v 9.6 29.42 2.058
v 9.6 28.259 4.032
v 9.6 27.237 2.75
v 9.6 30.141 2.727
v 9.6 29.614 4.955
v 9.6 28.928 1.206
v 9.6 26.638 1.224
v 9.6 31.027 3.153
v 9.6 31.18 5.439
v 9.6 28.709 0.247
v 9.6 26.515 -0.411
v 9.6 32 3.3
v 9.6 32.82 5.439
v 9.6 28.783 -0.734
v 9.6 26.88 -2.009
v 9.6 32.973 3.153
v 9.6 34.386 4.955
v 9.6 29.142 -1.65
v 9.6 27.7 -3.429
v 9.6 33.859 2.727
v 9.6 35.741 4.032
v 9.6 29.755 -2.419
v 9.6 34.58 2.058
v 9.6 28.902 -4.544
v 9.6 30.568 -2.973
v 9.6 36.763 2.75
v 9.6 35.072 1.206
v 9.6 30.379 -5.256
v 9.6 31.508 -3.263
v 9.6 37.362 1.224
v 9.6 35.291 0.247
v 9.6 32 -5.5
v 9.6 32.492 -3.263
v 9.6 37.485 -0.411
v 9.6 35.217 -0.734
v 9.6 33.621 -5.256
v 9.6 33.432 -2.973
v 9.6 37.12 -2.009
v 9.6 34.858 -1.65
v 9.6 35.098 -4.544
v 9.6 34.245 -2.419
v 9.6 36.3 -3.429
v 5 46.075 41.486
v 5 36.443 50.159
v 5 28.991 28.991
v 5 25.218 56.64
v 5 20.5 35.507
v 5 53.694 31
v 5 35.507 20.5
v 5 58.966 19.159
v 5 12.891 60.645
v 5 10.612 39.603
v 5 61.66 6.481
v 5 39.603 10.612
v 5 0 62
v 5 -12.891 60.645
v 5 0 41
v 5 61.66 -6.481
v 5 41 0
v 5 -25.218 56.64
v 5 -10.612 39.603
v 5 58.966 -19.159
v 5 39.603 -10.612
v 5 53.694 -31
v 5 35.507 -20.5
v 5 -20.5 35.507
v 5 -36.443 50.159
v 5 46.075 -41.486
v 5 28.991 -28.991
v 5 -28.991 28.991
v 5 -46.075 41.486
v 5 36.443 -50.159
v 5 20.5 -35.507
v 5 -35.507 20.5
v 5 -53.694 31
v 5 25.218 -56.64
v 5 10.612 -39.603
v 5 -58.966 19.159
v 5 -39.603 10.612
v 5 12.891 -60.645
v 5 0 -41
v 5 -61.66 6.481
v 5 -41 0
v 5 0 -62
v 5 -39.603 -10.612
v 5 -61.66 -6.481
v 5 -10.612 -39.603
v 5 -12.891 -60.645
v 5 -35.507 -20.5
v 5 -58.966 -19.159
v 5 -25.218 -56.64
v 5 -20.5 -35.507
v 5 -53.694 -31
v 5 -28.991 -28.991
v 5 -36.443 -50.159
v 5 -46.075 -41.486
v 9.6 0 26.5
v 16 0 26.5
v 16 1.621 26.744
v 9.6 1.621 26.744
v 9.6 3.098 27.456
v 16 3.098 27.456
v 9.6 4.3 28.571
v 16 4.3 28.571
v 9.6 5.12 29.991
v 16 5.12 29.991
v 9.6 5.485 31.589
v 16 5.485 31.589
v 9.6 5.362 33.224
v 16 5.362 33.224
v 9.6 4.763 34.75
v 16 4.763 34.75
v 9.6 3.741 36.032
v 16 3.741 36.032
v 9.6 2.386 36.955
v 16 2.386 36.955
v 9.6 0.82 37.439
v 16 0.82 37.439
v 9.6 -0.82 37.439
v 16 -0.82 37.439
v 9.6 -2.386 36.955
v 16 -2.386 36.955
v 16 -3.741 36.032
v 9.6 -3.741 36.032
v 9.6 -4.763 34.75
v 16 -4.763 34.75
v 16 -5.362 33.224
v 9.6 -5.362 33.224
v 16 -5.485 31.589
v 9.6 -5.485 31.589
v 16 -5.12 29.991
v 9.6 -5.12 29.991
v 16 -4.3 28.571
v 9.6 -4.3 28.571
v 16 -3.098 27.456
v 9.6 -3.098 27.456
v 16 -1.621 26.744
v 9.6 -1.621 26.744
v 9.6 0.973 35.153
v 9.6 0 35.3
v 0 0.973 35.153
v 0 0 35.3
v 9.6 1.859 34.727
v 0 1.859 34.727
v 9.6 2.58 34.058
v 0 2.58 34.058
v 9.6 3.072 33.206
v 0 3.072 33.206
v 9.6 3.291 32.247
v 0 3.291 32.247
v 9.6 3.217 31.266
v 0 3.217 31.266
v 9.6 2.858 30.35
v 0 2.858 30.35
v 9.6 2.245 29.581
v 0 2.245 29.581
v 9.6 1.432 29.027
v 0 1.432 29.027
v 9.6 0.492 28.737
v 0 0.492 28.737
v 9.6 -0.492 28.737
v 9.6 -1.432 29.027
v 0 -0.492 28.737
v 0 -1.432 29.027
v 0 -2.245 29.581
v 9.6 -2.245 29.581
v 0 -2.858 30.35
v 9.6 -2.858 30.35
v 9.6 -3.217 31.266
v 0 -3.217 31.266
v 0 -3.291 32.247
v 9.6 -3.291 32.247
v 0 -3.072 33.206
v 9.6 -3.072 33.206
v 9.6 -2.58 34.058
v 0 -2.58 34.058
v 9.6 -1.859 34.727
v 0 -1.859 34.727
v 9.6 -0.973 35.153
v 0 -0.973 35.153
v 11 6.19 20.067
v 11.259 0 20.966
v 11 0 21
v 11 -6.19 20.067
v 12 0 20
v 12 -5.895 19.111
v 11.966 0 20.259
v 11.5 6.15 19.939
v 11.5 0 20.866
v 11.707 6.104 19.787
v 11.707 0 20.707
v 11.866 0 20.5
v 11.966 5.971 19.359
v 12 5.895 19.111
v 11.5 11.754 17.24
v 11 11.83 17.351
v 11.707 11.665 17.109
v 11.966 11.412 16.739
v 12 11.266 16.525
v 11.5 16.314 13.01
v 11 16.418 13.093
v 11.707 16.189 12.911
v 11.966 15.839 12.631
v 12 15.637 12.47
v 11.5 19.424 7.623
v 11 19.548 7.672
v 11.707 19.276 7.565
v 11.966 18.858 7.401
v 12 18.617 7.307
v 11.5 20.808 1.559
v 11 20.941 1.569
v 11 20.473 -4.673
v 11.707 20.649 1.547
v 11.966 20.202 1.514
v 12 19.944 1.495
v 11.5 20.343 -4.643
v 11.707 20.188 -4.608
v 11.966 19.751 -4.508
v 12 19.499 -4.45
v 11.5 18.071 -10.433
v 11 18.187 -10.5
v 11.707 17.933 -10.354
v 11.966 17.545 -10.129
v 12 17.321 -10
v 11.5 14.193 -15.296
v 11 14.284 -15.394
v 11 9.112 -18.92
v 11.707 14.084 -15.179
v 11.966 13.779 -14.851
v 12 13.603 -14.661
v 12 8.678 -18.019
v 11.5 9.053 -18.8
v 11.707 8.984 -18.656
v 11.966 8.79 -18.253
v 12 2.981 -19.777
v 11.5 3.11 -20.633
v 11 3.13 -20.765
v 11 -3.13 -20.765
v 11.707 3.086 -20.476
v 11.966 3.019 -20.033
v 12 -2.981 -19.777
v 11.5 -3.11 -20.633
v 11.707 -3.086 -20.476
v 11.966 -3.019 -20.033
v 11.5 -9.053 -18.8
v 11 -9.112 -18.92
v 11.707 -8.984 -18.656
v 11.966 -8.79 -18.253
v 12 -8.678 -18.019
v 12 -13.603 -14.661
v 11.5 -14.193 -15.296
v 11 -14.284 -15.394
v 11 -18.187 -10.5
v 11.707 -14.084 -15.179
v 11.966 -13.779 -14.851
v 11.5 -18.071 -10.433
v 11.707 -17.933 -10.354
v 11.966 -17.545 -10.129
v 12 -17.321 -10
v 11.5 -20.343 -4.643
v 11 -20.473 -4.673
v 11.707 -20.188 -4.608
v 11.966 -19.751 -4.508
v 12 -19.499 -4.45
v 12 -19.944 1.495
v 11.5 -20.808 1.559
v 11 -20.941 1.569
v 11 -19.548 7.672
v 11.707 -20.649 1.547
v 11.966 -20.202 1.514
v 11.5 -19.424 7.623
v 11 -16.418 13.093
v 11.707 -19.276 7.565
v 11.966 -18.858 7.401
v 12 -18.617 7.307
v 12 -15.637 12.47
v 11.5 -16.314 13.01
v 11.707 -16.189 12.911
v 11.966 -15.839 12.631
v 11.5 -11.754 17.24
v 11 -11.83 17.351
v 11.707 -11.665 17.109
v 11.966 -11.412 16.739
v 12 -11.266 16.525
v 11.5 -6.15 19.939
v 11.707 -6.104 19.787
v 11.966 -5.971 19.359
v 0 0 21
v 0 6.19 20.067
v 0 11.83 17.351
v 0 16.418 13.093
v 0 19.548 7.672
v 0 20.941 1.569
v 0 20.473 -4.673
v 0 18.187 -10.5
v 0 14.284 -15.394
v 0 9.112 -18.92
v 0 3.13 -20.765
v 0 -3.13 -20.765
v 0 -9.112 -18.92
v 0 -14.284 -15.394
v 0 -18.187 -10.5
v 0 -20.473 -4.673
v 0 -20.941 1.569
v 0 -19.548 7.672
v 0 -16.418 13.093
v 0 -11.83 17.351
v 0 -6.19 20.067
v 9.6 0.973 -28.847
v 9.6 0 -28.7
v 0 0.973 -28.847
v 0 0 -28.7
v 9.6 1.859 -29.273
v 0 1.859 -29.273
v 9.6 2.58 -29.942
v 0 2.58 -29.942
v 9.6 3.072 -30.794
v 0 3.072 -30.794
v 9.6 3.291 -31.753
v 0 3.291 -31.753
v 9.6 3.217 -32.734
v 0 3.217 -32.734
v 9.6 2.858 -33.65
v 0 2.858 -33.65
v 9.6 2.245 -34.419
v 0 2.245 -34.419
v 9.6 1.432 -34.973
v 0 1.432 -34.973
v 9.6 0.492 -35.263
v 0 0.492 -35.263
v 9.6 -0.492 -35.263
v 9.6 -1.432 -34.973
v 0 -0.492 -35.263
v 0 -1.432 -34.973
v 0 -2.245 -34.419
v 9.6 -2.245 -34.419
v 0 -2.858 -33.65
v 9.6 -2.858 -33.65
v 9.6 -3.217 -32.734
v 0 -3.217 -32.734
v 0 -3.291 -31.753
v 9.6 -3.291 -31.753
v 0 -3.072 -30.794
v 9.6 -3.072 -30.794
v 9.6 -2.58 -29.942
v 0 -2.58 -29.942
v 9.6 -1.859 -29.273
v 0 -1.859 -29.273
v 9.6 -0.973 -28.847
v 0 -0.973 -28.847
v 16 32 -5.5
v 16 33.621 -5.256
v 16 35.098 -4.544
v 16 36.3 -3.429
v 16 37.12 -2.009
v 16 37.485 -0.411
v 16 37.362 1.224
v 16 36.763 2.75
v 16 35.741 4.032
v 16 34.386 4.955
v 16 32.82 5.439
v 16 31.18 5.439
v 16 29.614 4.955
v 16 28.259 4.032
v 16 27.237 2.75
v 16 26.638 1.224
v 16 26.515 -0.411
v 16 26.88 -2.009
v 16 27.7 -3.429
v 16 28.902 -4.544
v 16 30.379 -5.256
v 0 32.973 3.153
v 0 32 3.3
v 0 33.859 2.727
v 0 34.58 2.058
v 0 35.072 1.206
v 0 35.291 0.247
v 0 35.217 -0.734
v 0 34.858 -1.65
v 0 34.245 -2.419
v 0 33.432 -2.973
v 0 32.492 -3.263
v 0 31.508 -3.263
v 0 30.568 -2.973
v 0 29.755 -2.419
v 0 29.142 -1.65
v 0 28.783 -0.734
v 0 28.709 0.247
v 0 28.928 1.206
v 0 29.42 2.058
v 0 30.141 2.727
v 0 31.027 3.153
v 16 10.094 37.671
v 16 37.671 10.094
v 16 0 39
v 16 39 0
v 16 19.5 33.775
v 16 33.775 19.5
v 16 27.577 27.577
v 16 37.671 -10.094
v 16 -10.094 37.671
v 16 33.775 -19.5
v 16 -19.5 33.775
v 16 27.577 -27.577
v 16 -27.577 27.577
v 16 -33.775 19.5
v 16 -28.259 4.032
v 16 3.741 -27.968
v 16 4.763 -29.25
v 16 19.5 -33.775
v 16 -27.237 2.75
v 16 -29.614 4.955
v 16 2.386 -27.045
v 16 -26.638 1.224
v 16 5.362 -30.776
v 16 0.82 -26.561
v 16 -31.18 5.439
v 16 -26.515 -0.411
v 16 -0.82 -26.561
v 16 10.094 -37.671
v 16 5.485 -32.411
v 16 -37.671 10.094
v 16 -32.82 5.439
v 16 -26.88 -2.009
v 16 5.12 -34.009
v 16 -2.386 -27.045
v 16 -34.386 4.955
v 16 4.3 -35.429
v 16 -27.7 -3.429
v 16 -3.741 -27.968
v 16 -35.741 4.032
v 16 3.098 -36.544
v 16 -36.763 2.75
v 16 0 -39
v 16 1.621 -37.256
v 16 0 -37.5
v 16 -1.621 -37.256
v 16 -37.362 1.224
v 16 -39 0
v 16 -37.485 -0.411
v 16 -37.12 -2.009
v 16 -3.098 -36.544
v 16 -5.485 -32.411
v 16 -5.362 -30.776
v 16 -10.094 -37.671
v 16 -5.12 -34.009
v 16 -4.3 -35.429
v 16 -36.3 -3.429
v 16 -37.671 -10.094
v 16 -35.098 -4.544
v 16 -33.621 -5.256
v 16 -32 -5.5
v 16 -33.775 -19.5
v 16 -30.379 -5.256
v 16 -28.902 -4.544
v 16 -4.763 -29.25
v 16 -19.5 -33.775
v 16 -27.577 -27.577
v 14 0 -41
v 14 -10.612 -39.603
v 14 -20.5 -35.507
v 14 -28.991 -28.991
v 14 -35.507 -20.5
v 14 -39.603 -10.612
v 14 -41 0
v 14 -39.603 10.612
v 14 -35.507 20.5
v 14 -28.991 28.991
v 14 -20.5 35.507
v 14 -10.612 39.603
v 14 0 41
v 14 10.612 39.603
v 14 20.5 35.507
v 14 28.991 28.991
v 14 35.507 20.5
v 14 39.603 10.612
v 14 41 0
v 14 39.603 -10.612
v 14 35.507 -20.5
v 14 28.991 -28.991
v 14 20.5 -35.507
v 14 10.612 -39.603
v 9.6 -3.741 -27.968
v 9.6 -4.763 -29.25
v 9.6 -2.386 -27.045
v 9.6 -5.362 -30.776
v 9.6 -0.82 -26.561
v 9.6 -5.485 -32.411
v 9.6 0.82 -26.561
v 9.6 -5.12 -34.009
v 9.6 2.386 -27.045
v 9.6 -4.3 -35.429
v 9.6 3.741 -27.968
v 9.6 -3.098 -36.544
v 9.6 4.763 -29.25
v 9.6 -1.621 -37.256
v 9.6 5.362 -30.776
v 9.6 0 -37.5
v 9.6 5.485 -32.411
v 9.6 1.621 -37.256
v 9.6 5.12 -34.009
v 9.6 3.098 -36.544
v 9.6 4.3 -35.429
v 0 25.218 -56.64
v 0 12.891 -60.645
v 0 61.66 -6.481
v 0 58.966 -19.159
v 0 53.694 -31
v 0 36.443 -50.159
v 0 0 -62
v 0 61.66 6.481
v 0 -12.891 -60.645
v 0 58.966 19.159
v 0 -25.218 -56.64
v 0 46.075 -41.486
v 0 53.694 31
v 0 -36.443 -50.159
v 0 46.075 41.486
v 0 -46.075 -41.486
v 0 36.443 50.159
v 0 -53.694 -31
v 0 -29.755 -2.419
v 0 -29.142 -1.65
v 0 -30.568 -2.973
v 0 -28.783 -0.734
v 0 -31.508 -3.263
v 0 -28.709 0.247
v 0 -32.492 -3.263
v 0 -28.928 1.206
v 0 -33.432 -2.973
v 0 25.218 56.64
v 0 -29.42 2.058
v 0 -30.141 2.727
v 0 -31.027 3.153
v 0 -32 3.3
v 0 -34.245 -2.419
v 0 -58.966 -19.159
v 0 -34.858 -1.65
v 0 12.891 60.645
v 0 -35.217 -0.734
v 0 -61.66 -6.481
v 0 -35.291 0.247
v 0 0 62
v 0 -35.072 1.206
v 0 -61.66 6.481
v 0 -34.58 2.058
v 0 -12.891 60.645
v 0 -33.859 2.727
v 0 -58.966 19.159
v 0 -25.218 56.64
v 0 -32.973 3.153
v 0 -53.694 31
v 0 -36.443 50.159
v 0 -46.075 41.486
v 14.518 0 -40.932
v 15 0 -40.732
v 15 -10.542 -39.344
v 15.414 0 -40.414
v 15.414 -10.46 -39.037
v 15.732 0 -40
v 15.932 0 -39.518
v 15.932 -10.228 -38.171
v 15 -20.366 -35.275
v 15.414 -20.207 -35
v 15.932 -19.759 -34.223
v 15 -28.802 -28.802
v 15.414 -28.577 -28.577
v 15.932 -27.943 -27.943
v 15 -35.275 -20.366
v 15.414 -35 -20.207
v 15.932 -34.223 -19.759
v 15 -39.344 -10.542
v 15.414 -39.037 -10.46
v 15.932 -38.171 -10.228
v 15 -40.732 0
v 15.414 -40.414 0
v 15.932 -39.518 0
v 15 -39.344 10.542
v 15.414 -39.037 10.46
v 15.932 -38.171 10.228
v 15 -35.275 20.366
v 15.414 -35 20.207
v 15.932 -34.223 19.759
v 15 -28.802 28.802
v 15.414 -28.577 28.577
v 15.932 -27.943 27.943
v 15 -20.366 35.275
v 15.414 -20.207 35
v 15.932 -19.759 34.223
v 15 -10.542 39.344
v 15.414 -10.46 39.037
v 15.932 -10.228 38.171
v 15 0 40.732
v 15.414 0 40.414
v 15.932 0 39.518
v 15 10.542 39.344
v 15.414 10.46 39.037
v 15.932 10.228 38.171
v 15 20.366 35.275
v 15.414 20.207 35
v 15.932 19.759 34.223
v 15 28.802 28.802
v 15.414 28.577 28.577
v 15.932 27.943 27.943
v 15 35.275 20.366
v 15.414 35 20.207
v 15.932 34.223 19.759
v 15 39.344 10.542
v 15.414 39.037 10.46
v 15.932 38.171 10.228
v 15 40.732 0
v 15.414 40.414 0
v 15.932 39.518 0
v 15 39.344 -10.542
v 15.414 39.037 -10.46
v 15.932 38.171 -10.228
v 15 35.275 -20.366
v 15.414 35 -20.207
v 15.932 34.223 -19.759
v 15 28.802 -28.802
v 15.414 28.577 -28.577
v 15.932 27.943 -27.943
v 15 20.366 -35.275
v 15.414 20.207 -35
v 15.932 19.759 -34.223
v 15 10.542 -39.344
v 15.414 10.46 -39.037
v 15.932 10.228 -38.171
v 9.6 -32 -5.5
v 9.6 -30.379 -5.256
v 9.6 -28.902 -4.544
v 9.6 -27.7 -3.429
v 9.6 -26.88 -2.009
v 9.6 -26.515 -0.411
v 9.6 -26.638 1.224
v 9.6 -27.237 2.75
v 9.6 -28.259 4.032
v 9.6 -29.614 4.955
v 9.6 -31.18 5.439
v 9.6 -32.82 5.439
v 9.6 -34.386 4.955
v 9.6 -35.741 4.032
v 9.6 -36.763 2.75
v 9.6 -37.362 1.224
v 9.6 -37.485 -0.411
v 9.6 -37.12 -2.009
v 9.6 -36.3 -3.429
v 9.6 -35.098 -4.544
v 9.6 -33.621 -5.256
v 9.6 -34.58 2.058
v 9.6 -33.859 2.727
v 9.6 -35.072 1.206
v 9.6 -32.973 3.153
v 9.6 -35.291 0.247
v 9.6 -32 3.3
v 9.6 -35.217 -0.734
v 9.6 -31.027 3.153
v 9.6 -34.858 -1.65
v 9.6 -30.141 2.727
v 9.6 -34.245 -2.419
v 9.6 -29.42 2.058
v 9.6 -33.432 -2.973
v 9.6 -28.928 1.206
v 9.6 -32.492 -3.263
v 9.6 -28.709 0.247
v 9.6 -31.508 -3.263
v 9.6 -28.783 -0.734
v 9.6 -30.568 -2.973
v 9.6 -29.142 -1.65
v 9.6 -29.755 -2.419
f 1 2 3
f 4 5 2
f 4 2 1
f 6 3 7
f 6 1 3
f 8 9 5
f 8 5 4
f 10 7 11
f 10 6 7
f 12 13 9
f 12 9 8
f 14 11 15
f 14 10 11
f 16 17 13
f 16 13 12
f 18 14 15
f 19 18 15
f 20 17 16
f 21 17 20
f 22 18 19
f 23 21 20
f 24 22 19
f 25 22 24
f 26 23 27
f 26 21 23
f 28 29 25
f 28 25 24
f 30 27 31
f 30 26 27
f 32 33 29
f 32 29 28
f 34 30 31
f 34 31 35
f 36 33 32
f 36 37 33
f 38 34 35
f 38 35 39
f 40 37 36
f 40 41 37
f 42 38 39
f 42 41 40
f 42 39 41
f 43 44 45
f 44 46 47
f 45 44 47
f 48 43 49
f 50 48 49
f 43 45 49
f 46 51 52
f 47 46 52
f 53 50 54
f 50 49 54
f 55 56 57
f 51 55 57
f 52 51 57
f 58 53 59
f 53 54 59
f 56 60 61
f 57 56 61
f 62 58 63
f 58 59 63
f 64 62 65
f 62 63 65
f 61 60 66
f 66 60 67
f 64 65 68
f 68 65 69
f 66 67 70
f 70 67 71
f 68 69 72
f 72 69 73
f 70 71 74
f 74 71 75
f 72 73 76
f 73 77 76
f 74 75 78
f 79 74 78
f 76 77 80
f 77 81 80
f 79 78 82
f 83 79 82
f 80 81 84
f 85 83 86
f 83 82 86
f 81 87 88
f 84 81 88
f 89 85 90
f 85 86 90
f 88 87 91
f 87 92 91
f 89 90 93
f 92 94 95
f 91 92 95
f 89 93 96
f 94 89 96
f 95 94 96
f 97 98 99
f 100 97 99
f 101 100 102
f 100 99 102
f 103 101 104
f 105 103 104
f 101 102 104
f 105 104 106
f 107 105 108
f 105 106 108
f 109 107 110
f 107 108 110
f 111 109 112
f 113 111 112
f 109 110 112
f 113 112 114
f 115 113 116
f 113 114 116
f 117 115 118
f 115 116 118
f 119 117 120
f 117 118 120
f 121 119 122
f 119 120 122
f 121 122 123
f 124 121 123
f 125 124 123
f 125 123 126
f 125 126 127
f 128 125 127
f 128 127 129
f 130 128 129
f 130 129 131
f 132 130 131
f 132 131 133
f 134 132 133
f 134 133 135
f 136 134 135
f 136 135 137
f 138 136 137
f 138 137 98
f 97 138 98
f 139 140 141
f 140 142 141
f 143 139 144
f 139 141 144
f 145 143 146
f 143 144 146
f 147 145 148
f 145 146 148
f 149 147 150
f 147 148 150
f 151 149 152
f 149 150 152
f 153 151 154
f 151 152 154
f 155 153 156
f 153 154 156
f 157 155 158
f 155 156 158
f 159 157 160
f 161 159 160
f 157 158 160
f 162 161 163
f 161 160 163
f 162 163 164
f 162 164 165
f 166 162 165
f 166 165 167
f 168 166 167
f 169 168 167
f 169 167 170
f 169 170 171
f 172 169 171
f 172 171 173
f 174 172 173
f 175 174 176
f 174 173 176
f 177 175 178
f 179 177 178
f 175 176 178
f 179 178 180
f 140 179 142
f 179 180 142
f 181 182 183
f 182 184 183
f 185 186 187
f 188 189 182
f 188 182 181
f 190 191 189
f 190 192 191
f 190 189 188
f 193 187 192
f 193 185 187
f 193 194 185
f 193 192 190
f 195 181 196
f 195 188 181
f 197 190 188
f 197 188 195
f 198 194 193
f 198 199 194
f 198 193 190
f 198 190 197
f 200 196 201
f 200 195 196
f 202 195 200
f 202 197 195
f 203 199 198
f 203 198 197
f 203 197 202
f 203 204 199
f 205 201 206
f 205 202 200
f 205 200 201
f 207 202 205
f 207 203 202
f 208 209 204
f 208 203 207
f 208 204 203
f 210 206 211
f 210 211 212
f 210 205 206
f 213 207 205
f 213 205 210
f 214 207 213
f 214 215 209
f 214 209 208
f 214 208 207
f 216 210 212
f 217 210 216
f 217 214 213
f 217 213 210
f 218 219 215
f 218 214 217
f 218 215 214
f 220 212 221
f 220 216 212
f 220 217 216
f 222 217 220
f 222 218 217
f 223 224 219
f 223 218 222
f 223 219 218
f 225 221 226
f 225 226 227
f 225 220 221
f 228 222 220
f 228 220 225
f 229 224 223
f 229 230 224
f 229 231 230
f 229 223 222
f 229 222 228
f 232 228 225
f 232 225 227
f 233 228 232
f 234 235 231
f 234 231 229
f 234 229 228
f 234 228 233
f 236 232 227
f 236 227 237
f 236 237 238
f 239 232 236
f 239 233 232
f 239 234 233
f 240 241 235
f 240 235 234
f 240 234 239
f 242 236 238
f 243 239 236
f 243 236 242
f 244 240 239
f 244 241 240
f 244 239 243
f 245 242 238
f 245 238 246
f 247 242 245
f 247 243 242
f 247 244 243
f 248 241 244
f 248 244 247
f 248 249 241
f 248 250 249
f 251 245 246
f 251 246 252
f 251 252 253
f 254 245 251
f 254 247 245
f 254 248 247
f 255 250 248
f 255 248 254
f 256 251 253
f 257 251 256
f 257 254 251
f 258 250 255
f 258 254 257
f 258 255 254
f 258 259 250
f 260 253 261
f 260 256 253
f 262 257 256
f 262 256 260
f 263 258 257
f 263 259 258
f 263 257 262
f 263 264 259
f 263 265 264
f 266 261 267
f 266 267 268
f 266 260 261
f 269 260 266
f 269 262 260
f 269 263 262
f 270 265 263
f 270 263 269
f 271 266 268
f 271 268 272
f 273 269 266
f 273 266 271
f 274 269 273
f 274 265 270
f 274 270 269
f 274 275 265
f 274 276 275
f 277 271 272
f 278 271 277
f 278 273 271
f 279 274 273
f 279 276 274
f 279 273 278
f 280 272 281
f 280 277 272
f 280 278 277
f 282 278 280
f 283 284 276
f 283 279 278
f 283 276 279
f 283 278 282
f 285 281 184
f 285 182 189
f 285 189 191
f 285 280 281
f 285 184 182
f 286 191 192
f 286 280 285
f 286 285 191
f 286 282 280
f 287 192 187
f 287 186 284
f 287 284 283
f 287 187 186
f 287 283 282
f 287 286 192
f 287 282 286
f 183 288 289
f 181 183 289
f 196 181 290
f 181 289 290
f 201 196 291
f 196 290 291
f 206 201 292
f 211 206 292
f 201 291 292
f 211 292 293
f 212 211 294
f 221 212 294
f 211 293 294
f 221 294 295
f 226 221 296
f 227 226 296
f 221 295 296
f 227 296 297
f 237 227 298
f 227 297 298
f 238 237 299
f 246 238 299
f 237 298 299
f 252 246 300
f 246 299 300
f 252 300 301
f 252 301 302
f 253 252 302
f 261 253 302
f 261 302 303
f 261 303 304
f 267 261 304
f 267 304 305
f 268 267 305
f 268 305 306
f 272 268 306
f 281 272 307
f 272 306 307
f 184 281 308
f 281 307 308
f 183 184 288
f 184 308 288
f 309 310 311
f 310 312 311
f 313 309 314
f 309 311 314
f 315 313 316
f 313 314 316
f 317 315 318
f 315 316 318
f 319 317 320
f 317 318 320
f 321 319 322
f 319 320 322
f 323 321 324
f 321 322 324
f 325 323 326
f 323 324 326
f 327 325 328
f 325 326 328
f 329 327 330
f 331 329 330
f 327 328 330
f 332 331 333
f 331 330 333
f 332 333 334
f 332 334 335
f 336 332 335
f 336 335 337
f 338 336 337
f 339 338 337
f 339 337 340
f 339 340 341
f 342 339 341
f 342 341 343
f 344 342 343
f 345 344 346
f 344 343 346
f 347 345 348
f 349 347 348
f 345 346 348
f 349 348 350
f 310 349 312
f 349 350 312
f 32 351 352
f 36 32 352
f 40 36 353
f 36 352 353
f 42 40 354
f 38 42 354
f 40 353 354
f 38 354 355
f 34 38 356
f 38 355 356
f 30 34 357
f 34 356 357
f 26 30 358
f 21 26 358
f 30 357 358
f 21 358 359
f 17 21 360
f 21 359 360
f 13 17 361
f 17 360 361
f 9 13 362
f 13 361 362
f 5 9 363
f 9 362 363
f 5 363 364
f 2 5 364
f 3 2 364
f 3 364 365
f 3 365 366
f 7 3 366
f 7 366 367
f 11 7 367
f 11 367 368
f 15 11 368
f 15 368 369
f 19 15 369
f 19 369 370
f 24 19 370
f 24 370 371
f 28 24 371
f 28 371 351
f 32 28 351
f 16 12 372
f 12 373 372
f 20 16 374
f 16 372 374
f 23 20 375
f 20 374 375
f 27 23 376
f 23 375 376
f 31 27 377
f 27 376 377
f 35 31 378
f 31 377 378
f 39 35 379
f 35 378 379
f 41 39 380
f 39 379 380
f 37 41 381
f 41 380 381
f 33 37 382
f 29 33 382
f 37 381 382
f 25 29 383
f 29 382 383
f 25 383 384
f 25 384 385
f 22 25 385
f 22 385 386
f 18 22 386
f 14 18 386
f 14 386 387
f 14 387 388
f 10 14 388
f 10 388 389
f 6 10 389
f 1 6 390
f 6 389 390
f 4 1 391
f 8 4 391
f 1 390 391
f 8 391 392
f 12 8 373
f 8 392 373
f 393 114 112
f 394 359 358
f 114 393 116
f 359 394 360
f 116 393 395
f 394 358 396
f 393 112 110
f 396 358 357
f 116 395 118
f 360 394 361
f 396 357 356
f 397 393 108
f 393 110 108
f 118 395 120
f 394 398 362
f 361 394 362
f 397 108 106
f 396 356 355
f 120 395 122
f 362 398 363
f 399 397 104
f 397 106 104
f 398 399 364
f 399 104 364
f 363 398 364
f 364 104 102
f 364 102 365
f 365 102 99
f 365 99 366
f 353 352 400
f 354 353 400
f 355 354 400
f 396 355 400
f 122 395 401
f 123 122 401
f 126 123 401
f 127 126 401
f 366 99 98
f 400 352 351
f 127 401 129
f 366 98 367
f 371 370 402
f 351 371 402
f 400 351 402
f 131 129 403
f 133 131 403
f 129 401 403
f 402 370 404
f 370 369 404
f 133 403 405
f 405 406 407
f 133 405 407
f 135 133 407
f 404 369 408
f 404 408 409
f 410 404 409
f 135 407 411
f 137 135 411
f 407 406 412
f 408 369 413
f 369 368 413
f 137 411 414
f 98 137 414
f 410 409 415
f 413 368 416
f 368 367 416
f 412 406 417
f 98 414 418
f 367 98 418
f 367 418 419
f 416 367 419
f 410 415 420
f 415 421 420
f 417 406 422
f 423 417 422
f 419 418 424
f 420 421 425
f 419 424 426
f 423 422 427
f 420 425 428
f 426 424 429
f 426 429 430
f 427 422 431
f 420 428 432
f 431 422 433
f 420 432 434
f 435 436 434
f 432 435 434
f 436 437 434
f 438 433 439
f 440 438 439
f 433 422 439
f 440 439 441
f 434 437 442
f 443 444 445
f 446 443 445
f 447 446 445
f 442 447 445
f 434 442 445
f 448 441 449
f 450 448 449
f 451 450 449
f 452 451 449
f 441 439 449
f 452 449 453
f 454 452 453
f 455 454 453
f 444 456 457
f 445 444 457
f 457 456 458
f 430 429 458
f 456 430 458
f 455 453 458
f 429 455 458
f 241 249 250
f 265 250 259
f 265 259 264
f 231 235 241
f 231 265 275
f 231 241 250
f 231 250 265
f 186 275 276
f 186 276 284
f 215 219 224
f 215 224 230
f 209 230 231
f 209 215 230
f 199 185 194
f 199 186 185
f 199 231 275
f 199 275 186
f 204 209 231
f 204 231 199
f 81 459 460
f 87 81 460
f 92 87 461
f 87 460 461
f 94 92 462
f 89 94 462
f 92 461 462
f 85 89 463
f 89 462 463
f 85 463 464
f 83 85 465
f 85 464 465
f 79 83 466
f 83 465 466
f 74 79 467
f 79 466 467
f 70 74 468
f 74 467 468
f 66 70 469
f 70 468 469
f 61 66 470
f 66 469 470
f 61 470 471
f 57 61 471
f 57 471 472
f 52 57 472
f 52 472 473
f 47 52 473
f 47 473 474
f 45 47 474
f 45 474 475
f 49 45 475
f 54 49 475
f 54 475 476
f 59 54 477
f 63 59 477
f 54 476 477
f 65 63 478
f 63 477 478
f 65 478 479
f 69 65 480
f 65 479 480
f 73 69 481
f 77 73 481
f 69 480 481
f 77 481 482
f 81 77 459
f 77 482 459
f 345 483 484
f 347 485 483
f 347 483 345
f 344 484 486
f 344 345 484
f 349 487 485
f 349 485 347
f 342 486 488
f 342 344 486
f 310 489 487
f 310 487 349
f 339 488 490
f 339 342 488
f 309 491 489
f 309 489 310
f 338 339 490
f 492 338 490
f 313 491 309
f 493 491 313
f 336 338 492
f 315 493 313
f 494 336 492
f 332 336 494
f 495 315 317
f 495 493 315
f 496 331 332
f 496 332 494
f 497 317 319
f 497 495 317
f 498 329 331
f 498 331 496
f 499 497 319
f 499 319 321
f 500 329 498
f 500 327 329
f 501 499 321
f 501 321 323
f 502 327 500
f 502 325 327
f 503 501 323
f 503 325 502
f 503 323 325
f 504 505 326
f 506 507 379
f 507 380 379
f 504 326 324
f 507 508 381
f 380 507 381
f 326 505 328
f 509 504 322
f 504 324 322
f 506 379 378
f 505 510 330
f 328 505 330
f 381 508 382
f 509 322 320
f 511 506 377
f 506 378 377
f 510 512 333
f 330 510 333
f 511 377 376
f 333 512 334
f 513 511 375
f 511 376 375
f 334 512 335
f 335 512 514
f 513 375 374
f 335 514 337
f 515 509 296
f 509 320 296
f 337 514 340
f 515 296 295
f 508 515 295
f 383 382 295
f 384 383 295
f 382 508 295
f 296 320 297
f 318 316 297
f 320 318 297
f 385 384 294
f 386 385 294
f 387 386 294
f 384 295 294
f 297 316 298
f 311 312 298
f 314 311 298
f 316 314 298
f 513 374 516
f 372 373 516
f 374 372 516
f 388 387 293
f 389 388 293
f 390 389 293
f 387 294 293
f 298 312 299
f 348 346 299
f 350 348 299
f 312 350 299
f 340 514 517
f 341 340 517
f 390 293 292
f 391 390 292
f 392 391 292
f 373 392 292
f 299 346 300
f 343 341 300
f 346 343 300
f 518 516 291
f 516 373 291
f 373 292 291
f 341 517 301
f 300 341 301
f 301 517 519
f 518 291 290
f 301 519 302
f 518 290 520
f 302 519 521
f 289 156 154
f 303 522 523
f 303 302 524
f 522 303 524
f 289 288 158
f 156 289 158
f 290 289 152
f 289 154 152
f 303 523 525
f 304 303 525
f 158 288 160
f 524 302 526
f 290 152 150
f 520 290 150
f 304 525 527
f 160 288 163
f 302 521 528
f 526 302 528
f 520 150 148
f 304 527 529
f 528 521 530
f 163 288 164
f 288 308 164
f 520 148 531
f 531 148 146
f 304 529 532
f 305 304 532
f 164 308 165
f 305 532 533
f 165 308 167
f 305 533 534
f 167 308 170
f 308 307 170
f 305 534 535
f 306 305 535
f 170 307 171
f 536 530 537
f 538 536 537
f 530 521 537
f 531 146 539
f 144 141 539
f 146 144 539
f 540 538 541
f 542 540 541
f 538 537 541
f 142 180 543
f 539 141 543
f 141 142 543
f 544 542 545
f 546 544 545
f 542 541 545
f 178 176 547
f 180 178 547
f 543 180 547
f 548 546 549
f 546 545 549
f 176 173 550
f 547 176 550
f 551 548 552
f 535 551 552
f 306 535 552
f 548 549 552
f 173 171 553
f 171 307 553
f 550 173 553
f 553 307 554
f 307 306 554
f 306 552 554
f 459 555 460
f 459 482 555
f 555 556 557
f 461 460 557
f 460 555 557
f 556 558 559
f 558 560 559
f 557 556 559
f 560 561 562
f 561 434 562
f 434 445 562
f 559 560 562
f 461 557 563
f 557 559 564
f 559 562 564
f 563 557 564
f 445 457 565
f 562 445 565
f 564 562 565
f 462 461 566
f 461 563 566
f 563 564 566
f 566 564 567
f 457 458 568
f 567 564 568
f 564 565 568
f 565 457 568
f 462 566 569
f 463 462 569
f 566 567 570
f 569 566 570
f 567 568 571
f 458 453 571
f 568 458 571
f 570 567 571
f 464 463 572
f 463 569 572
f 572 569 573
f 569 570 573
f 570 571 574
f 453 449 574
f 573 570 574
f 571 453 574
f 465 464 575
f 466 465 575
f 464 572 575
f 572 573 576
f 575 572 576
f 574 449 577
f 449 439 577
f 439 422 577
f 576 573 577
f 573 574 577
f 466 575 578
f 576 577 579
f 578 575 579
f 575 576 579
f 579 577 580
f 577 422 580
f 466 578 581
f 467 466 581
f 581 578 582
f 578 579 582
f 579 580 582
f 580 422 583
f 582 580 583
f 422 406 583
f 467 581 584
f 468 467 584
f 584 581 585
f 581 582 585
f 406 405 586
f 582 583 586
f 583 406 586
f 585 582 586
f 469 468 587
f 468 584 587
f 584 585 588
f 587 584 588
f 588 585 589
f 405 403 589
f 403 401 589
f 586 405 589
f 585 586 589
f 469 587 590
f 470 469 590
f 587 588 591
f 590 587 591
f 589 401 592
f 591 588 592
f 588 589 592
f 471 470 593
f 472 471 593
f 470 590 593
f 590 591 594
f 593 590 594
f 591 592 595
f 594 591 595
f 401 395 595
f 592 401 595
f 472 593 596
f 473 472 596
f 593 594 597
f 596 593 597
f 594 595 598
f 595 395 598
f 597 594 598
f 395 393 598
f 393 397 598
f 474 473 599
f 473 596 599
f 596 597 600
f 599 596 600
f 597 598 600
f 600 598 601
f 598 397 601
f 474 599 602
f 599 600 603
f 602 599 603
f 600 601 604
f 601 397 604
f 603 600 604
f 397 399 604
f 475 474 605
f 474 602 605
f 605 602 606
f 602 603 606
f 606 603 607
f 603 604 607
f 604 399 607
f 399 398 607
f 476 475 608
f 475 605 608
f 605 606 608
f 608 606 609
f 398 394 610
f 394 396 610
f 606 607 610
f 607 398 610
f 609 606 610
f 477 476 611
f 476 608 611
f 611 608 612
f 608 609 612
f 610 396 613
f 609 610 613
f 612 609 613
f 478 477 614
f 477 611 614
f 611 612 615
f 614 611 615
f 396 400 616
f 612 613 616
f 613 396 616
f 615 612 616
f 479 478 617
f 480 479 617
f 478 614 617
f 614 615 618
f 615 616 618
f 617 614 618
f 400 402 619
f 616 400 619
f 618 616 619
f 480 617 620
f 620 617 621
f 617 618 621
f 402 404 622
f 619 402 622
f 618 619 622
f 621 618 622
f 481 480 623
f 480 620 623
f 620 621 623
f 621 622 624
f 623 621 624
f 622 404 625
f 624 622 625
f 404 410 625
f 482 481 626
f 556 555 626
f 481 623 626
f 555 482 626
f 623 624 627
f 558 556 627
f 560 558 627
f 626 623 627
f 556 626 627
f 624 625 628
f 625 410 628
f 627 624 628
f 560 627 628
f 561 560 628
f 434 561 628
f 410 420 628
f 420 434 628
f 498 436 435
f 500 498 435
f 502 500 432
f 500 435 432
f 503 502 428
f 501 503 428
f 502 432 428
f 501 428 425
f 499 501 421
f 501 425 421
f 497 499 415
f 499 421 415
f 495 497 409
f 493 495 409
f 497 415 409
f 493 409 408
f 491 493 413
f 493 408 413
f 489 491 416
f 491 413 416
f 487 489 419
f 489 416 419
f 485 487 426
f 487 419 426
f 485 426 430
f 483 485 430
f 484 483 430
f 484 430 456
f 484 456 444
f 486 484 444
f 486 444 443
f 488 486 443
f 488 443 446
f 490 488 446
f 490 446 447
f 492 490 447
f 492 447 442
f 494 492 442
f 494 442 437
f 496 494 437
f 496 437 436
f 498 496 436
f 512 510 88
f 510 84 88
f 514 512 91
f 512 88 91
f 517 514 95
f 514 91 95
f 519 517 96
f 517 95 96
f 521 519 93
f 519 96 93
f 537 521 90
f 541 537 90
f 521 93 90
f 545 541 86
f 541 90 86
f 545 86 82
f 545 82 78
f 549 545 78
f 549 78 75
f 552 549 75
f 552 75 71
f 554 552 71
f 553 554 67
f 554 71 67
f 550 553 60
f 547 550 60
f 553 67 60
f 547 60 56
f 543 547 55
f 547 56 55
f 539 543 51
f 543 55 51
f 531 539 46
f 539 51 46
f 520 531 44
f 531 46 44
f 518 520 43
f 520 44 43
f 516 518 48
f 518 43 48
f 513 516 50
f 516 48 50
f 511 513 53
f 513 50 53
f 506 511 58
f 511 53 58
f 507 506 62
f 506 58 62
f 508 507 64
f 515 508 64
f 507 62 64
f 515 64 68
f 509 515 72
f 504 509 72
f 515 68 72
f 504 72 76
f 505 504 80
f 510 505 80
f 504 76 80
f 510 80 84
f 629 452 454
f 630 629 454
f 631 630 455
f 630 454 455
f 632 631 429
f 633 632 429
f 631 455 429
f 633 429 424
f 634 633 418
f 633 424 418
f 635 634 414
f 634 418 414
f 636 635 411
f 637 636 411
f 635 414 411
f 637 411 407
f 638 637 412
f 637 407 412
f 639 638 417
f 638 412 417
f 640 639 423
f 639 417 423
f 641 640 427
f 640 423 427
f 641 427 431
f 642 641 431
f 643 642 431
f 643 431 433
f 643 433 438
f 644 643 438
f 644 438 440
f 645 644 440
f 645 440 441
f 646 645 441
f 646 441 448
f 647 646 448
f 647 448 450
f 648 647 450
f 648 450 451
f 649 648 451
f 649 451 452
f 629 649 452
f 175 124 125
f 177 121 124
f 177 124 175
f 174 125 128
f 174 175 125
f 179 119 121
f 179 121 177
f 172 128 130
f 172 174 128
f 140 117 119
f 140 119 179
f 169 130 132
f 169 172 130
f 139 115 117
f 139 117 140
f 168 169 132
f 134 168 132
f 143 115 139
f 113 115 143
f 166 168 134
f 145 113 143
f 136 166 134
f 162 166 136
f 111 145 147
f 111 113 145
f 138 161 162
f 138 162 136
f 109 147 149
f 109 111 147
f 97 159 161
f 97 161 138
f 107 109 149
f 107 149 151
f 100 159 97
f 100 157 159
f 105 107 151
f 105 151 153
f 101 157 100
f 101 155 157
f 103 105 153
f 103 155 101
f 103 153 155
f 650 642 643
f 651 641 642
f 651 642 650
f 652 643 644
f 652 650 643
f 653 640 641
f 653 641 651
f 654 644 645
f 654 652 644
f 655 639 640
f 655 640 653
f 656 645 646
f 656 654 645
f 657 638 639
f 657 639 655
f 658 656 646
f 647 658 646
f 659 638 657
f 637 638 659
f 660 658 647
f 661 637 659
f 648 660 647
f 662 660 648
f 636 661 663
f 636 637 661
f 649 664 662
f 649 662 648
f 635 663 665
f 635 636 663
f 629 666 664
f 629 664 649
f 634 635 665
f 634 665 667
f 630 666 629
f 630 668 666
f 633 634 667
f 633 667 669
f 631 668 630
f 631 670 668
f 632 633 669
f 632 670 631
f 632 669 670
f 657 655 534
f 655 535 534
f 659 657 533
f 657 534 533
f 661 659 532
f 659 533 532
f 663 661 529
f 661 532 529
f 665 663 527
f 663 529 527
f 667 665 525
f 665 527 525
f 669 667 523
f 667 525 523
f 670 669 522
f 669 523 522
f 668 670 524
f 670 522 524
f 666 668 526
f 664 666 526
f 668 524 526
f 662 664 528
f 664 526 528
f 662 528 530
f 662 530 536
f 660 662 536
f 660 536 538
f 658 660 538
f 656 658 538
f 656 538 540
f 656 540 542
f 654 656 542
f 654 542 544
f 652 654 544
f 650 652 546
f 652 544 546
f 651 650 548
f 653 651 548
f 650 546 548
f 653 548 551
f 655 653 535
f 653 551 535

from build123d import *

# Parameters (mm, degrees)
SKETCH3_R                                           = 21
CUT_EXTRUDE1_DEPTH                                  = 12
FILLET1_R                                           = 1
FILLET2_R                                           = 2
CBORE_FOR_M6_HEX_SOCKET_HEAD_CAP_SCREW1_D           = 6.6
CBORE_FOR_M6_HEX_SOCKET_HEAD_CAP_SCREW1_CBORE_D     = 11
CBORE_FOR_M6_HEX_SOCKET_HEAD_CAP_SCREW1_CBORE_DEPTH = 6.4


with BuildPart() as part:
    # Sketch1 → Revolve1 (revolve)
    with BuildSketch(Plane.XY, mode=Mode.PRIVATE) as revolve1_sk:
        Polygon((0, 0), (0, 62), (5, 62), (5, 41), (16, 41), (16, 0), align=None)
    revolve(revolve1_sk.sketch.rotate(Axis((16, 0, 0), (-1, 0, 0)), 90), axis=Axis((16, 0, 0), (-1, 0, 0)))

    # Sketch3 → Cut-Extrude1 (cut)
    with BuildSketch(Plane.ZY):
        Circle(SKETCH3_R)
    extrude(amount=-CUT_EXTRUDE1_DEPTH, mode=Mode.SUBTRACT)

    # Fillet1
    fillet1_edges = [part.edges().sort_by_distance(p)[0] for p in [
        (12, 0, -21),
    ]]
    fillet(fillet1_edges, radius=FILLET1_R)

    # Fillet2
    fillet2_edges = [part.edges().sort_by_distance(p)[0] for p in [
        (16, 0, 41),
    ]]
    fillet(fillet2_edges, radius=FILLET2_R)

    # CBORE for M6 Hex Socket Head Cap Screw1 (through all)
    with Locations(Plane(origin=(16, 0, 0), x_dir=(0, 0, -1), z_dir=(1, 0, 0))):
        with Locations((0, -32), (32, 0), (0, 32), (-32, 0)):
            CounterBoreHole(CBORE_FOR_M6_HEX_SOCKET_HEAD_CAP_SCREW1_D / 2, CBORE_FOR_M6_HEX_SOCKET_HEAD_CAP_SCREW1_CBORE_D / 2, CBORE_FOR_M6_HEX_SOCKET_HEAD_CAP_SCREW1_CBORE_DEPTH)


solid = part.part
